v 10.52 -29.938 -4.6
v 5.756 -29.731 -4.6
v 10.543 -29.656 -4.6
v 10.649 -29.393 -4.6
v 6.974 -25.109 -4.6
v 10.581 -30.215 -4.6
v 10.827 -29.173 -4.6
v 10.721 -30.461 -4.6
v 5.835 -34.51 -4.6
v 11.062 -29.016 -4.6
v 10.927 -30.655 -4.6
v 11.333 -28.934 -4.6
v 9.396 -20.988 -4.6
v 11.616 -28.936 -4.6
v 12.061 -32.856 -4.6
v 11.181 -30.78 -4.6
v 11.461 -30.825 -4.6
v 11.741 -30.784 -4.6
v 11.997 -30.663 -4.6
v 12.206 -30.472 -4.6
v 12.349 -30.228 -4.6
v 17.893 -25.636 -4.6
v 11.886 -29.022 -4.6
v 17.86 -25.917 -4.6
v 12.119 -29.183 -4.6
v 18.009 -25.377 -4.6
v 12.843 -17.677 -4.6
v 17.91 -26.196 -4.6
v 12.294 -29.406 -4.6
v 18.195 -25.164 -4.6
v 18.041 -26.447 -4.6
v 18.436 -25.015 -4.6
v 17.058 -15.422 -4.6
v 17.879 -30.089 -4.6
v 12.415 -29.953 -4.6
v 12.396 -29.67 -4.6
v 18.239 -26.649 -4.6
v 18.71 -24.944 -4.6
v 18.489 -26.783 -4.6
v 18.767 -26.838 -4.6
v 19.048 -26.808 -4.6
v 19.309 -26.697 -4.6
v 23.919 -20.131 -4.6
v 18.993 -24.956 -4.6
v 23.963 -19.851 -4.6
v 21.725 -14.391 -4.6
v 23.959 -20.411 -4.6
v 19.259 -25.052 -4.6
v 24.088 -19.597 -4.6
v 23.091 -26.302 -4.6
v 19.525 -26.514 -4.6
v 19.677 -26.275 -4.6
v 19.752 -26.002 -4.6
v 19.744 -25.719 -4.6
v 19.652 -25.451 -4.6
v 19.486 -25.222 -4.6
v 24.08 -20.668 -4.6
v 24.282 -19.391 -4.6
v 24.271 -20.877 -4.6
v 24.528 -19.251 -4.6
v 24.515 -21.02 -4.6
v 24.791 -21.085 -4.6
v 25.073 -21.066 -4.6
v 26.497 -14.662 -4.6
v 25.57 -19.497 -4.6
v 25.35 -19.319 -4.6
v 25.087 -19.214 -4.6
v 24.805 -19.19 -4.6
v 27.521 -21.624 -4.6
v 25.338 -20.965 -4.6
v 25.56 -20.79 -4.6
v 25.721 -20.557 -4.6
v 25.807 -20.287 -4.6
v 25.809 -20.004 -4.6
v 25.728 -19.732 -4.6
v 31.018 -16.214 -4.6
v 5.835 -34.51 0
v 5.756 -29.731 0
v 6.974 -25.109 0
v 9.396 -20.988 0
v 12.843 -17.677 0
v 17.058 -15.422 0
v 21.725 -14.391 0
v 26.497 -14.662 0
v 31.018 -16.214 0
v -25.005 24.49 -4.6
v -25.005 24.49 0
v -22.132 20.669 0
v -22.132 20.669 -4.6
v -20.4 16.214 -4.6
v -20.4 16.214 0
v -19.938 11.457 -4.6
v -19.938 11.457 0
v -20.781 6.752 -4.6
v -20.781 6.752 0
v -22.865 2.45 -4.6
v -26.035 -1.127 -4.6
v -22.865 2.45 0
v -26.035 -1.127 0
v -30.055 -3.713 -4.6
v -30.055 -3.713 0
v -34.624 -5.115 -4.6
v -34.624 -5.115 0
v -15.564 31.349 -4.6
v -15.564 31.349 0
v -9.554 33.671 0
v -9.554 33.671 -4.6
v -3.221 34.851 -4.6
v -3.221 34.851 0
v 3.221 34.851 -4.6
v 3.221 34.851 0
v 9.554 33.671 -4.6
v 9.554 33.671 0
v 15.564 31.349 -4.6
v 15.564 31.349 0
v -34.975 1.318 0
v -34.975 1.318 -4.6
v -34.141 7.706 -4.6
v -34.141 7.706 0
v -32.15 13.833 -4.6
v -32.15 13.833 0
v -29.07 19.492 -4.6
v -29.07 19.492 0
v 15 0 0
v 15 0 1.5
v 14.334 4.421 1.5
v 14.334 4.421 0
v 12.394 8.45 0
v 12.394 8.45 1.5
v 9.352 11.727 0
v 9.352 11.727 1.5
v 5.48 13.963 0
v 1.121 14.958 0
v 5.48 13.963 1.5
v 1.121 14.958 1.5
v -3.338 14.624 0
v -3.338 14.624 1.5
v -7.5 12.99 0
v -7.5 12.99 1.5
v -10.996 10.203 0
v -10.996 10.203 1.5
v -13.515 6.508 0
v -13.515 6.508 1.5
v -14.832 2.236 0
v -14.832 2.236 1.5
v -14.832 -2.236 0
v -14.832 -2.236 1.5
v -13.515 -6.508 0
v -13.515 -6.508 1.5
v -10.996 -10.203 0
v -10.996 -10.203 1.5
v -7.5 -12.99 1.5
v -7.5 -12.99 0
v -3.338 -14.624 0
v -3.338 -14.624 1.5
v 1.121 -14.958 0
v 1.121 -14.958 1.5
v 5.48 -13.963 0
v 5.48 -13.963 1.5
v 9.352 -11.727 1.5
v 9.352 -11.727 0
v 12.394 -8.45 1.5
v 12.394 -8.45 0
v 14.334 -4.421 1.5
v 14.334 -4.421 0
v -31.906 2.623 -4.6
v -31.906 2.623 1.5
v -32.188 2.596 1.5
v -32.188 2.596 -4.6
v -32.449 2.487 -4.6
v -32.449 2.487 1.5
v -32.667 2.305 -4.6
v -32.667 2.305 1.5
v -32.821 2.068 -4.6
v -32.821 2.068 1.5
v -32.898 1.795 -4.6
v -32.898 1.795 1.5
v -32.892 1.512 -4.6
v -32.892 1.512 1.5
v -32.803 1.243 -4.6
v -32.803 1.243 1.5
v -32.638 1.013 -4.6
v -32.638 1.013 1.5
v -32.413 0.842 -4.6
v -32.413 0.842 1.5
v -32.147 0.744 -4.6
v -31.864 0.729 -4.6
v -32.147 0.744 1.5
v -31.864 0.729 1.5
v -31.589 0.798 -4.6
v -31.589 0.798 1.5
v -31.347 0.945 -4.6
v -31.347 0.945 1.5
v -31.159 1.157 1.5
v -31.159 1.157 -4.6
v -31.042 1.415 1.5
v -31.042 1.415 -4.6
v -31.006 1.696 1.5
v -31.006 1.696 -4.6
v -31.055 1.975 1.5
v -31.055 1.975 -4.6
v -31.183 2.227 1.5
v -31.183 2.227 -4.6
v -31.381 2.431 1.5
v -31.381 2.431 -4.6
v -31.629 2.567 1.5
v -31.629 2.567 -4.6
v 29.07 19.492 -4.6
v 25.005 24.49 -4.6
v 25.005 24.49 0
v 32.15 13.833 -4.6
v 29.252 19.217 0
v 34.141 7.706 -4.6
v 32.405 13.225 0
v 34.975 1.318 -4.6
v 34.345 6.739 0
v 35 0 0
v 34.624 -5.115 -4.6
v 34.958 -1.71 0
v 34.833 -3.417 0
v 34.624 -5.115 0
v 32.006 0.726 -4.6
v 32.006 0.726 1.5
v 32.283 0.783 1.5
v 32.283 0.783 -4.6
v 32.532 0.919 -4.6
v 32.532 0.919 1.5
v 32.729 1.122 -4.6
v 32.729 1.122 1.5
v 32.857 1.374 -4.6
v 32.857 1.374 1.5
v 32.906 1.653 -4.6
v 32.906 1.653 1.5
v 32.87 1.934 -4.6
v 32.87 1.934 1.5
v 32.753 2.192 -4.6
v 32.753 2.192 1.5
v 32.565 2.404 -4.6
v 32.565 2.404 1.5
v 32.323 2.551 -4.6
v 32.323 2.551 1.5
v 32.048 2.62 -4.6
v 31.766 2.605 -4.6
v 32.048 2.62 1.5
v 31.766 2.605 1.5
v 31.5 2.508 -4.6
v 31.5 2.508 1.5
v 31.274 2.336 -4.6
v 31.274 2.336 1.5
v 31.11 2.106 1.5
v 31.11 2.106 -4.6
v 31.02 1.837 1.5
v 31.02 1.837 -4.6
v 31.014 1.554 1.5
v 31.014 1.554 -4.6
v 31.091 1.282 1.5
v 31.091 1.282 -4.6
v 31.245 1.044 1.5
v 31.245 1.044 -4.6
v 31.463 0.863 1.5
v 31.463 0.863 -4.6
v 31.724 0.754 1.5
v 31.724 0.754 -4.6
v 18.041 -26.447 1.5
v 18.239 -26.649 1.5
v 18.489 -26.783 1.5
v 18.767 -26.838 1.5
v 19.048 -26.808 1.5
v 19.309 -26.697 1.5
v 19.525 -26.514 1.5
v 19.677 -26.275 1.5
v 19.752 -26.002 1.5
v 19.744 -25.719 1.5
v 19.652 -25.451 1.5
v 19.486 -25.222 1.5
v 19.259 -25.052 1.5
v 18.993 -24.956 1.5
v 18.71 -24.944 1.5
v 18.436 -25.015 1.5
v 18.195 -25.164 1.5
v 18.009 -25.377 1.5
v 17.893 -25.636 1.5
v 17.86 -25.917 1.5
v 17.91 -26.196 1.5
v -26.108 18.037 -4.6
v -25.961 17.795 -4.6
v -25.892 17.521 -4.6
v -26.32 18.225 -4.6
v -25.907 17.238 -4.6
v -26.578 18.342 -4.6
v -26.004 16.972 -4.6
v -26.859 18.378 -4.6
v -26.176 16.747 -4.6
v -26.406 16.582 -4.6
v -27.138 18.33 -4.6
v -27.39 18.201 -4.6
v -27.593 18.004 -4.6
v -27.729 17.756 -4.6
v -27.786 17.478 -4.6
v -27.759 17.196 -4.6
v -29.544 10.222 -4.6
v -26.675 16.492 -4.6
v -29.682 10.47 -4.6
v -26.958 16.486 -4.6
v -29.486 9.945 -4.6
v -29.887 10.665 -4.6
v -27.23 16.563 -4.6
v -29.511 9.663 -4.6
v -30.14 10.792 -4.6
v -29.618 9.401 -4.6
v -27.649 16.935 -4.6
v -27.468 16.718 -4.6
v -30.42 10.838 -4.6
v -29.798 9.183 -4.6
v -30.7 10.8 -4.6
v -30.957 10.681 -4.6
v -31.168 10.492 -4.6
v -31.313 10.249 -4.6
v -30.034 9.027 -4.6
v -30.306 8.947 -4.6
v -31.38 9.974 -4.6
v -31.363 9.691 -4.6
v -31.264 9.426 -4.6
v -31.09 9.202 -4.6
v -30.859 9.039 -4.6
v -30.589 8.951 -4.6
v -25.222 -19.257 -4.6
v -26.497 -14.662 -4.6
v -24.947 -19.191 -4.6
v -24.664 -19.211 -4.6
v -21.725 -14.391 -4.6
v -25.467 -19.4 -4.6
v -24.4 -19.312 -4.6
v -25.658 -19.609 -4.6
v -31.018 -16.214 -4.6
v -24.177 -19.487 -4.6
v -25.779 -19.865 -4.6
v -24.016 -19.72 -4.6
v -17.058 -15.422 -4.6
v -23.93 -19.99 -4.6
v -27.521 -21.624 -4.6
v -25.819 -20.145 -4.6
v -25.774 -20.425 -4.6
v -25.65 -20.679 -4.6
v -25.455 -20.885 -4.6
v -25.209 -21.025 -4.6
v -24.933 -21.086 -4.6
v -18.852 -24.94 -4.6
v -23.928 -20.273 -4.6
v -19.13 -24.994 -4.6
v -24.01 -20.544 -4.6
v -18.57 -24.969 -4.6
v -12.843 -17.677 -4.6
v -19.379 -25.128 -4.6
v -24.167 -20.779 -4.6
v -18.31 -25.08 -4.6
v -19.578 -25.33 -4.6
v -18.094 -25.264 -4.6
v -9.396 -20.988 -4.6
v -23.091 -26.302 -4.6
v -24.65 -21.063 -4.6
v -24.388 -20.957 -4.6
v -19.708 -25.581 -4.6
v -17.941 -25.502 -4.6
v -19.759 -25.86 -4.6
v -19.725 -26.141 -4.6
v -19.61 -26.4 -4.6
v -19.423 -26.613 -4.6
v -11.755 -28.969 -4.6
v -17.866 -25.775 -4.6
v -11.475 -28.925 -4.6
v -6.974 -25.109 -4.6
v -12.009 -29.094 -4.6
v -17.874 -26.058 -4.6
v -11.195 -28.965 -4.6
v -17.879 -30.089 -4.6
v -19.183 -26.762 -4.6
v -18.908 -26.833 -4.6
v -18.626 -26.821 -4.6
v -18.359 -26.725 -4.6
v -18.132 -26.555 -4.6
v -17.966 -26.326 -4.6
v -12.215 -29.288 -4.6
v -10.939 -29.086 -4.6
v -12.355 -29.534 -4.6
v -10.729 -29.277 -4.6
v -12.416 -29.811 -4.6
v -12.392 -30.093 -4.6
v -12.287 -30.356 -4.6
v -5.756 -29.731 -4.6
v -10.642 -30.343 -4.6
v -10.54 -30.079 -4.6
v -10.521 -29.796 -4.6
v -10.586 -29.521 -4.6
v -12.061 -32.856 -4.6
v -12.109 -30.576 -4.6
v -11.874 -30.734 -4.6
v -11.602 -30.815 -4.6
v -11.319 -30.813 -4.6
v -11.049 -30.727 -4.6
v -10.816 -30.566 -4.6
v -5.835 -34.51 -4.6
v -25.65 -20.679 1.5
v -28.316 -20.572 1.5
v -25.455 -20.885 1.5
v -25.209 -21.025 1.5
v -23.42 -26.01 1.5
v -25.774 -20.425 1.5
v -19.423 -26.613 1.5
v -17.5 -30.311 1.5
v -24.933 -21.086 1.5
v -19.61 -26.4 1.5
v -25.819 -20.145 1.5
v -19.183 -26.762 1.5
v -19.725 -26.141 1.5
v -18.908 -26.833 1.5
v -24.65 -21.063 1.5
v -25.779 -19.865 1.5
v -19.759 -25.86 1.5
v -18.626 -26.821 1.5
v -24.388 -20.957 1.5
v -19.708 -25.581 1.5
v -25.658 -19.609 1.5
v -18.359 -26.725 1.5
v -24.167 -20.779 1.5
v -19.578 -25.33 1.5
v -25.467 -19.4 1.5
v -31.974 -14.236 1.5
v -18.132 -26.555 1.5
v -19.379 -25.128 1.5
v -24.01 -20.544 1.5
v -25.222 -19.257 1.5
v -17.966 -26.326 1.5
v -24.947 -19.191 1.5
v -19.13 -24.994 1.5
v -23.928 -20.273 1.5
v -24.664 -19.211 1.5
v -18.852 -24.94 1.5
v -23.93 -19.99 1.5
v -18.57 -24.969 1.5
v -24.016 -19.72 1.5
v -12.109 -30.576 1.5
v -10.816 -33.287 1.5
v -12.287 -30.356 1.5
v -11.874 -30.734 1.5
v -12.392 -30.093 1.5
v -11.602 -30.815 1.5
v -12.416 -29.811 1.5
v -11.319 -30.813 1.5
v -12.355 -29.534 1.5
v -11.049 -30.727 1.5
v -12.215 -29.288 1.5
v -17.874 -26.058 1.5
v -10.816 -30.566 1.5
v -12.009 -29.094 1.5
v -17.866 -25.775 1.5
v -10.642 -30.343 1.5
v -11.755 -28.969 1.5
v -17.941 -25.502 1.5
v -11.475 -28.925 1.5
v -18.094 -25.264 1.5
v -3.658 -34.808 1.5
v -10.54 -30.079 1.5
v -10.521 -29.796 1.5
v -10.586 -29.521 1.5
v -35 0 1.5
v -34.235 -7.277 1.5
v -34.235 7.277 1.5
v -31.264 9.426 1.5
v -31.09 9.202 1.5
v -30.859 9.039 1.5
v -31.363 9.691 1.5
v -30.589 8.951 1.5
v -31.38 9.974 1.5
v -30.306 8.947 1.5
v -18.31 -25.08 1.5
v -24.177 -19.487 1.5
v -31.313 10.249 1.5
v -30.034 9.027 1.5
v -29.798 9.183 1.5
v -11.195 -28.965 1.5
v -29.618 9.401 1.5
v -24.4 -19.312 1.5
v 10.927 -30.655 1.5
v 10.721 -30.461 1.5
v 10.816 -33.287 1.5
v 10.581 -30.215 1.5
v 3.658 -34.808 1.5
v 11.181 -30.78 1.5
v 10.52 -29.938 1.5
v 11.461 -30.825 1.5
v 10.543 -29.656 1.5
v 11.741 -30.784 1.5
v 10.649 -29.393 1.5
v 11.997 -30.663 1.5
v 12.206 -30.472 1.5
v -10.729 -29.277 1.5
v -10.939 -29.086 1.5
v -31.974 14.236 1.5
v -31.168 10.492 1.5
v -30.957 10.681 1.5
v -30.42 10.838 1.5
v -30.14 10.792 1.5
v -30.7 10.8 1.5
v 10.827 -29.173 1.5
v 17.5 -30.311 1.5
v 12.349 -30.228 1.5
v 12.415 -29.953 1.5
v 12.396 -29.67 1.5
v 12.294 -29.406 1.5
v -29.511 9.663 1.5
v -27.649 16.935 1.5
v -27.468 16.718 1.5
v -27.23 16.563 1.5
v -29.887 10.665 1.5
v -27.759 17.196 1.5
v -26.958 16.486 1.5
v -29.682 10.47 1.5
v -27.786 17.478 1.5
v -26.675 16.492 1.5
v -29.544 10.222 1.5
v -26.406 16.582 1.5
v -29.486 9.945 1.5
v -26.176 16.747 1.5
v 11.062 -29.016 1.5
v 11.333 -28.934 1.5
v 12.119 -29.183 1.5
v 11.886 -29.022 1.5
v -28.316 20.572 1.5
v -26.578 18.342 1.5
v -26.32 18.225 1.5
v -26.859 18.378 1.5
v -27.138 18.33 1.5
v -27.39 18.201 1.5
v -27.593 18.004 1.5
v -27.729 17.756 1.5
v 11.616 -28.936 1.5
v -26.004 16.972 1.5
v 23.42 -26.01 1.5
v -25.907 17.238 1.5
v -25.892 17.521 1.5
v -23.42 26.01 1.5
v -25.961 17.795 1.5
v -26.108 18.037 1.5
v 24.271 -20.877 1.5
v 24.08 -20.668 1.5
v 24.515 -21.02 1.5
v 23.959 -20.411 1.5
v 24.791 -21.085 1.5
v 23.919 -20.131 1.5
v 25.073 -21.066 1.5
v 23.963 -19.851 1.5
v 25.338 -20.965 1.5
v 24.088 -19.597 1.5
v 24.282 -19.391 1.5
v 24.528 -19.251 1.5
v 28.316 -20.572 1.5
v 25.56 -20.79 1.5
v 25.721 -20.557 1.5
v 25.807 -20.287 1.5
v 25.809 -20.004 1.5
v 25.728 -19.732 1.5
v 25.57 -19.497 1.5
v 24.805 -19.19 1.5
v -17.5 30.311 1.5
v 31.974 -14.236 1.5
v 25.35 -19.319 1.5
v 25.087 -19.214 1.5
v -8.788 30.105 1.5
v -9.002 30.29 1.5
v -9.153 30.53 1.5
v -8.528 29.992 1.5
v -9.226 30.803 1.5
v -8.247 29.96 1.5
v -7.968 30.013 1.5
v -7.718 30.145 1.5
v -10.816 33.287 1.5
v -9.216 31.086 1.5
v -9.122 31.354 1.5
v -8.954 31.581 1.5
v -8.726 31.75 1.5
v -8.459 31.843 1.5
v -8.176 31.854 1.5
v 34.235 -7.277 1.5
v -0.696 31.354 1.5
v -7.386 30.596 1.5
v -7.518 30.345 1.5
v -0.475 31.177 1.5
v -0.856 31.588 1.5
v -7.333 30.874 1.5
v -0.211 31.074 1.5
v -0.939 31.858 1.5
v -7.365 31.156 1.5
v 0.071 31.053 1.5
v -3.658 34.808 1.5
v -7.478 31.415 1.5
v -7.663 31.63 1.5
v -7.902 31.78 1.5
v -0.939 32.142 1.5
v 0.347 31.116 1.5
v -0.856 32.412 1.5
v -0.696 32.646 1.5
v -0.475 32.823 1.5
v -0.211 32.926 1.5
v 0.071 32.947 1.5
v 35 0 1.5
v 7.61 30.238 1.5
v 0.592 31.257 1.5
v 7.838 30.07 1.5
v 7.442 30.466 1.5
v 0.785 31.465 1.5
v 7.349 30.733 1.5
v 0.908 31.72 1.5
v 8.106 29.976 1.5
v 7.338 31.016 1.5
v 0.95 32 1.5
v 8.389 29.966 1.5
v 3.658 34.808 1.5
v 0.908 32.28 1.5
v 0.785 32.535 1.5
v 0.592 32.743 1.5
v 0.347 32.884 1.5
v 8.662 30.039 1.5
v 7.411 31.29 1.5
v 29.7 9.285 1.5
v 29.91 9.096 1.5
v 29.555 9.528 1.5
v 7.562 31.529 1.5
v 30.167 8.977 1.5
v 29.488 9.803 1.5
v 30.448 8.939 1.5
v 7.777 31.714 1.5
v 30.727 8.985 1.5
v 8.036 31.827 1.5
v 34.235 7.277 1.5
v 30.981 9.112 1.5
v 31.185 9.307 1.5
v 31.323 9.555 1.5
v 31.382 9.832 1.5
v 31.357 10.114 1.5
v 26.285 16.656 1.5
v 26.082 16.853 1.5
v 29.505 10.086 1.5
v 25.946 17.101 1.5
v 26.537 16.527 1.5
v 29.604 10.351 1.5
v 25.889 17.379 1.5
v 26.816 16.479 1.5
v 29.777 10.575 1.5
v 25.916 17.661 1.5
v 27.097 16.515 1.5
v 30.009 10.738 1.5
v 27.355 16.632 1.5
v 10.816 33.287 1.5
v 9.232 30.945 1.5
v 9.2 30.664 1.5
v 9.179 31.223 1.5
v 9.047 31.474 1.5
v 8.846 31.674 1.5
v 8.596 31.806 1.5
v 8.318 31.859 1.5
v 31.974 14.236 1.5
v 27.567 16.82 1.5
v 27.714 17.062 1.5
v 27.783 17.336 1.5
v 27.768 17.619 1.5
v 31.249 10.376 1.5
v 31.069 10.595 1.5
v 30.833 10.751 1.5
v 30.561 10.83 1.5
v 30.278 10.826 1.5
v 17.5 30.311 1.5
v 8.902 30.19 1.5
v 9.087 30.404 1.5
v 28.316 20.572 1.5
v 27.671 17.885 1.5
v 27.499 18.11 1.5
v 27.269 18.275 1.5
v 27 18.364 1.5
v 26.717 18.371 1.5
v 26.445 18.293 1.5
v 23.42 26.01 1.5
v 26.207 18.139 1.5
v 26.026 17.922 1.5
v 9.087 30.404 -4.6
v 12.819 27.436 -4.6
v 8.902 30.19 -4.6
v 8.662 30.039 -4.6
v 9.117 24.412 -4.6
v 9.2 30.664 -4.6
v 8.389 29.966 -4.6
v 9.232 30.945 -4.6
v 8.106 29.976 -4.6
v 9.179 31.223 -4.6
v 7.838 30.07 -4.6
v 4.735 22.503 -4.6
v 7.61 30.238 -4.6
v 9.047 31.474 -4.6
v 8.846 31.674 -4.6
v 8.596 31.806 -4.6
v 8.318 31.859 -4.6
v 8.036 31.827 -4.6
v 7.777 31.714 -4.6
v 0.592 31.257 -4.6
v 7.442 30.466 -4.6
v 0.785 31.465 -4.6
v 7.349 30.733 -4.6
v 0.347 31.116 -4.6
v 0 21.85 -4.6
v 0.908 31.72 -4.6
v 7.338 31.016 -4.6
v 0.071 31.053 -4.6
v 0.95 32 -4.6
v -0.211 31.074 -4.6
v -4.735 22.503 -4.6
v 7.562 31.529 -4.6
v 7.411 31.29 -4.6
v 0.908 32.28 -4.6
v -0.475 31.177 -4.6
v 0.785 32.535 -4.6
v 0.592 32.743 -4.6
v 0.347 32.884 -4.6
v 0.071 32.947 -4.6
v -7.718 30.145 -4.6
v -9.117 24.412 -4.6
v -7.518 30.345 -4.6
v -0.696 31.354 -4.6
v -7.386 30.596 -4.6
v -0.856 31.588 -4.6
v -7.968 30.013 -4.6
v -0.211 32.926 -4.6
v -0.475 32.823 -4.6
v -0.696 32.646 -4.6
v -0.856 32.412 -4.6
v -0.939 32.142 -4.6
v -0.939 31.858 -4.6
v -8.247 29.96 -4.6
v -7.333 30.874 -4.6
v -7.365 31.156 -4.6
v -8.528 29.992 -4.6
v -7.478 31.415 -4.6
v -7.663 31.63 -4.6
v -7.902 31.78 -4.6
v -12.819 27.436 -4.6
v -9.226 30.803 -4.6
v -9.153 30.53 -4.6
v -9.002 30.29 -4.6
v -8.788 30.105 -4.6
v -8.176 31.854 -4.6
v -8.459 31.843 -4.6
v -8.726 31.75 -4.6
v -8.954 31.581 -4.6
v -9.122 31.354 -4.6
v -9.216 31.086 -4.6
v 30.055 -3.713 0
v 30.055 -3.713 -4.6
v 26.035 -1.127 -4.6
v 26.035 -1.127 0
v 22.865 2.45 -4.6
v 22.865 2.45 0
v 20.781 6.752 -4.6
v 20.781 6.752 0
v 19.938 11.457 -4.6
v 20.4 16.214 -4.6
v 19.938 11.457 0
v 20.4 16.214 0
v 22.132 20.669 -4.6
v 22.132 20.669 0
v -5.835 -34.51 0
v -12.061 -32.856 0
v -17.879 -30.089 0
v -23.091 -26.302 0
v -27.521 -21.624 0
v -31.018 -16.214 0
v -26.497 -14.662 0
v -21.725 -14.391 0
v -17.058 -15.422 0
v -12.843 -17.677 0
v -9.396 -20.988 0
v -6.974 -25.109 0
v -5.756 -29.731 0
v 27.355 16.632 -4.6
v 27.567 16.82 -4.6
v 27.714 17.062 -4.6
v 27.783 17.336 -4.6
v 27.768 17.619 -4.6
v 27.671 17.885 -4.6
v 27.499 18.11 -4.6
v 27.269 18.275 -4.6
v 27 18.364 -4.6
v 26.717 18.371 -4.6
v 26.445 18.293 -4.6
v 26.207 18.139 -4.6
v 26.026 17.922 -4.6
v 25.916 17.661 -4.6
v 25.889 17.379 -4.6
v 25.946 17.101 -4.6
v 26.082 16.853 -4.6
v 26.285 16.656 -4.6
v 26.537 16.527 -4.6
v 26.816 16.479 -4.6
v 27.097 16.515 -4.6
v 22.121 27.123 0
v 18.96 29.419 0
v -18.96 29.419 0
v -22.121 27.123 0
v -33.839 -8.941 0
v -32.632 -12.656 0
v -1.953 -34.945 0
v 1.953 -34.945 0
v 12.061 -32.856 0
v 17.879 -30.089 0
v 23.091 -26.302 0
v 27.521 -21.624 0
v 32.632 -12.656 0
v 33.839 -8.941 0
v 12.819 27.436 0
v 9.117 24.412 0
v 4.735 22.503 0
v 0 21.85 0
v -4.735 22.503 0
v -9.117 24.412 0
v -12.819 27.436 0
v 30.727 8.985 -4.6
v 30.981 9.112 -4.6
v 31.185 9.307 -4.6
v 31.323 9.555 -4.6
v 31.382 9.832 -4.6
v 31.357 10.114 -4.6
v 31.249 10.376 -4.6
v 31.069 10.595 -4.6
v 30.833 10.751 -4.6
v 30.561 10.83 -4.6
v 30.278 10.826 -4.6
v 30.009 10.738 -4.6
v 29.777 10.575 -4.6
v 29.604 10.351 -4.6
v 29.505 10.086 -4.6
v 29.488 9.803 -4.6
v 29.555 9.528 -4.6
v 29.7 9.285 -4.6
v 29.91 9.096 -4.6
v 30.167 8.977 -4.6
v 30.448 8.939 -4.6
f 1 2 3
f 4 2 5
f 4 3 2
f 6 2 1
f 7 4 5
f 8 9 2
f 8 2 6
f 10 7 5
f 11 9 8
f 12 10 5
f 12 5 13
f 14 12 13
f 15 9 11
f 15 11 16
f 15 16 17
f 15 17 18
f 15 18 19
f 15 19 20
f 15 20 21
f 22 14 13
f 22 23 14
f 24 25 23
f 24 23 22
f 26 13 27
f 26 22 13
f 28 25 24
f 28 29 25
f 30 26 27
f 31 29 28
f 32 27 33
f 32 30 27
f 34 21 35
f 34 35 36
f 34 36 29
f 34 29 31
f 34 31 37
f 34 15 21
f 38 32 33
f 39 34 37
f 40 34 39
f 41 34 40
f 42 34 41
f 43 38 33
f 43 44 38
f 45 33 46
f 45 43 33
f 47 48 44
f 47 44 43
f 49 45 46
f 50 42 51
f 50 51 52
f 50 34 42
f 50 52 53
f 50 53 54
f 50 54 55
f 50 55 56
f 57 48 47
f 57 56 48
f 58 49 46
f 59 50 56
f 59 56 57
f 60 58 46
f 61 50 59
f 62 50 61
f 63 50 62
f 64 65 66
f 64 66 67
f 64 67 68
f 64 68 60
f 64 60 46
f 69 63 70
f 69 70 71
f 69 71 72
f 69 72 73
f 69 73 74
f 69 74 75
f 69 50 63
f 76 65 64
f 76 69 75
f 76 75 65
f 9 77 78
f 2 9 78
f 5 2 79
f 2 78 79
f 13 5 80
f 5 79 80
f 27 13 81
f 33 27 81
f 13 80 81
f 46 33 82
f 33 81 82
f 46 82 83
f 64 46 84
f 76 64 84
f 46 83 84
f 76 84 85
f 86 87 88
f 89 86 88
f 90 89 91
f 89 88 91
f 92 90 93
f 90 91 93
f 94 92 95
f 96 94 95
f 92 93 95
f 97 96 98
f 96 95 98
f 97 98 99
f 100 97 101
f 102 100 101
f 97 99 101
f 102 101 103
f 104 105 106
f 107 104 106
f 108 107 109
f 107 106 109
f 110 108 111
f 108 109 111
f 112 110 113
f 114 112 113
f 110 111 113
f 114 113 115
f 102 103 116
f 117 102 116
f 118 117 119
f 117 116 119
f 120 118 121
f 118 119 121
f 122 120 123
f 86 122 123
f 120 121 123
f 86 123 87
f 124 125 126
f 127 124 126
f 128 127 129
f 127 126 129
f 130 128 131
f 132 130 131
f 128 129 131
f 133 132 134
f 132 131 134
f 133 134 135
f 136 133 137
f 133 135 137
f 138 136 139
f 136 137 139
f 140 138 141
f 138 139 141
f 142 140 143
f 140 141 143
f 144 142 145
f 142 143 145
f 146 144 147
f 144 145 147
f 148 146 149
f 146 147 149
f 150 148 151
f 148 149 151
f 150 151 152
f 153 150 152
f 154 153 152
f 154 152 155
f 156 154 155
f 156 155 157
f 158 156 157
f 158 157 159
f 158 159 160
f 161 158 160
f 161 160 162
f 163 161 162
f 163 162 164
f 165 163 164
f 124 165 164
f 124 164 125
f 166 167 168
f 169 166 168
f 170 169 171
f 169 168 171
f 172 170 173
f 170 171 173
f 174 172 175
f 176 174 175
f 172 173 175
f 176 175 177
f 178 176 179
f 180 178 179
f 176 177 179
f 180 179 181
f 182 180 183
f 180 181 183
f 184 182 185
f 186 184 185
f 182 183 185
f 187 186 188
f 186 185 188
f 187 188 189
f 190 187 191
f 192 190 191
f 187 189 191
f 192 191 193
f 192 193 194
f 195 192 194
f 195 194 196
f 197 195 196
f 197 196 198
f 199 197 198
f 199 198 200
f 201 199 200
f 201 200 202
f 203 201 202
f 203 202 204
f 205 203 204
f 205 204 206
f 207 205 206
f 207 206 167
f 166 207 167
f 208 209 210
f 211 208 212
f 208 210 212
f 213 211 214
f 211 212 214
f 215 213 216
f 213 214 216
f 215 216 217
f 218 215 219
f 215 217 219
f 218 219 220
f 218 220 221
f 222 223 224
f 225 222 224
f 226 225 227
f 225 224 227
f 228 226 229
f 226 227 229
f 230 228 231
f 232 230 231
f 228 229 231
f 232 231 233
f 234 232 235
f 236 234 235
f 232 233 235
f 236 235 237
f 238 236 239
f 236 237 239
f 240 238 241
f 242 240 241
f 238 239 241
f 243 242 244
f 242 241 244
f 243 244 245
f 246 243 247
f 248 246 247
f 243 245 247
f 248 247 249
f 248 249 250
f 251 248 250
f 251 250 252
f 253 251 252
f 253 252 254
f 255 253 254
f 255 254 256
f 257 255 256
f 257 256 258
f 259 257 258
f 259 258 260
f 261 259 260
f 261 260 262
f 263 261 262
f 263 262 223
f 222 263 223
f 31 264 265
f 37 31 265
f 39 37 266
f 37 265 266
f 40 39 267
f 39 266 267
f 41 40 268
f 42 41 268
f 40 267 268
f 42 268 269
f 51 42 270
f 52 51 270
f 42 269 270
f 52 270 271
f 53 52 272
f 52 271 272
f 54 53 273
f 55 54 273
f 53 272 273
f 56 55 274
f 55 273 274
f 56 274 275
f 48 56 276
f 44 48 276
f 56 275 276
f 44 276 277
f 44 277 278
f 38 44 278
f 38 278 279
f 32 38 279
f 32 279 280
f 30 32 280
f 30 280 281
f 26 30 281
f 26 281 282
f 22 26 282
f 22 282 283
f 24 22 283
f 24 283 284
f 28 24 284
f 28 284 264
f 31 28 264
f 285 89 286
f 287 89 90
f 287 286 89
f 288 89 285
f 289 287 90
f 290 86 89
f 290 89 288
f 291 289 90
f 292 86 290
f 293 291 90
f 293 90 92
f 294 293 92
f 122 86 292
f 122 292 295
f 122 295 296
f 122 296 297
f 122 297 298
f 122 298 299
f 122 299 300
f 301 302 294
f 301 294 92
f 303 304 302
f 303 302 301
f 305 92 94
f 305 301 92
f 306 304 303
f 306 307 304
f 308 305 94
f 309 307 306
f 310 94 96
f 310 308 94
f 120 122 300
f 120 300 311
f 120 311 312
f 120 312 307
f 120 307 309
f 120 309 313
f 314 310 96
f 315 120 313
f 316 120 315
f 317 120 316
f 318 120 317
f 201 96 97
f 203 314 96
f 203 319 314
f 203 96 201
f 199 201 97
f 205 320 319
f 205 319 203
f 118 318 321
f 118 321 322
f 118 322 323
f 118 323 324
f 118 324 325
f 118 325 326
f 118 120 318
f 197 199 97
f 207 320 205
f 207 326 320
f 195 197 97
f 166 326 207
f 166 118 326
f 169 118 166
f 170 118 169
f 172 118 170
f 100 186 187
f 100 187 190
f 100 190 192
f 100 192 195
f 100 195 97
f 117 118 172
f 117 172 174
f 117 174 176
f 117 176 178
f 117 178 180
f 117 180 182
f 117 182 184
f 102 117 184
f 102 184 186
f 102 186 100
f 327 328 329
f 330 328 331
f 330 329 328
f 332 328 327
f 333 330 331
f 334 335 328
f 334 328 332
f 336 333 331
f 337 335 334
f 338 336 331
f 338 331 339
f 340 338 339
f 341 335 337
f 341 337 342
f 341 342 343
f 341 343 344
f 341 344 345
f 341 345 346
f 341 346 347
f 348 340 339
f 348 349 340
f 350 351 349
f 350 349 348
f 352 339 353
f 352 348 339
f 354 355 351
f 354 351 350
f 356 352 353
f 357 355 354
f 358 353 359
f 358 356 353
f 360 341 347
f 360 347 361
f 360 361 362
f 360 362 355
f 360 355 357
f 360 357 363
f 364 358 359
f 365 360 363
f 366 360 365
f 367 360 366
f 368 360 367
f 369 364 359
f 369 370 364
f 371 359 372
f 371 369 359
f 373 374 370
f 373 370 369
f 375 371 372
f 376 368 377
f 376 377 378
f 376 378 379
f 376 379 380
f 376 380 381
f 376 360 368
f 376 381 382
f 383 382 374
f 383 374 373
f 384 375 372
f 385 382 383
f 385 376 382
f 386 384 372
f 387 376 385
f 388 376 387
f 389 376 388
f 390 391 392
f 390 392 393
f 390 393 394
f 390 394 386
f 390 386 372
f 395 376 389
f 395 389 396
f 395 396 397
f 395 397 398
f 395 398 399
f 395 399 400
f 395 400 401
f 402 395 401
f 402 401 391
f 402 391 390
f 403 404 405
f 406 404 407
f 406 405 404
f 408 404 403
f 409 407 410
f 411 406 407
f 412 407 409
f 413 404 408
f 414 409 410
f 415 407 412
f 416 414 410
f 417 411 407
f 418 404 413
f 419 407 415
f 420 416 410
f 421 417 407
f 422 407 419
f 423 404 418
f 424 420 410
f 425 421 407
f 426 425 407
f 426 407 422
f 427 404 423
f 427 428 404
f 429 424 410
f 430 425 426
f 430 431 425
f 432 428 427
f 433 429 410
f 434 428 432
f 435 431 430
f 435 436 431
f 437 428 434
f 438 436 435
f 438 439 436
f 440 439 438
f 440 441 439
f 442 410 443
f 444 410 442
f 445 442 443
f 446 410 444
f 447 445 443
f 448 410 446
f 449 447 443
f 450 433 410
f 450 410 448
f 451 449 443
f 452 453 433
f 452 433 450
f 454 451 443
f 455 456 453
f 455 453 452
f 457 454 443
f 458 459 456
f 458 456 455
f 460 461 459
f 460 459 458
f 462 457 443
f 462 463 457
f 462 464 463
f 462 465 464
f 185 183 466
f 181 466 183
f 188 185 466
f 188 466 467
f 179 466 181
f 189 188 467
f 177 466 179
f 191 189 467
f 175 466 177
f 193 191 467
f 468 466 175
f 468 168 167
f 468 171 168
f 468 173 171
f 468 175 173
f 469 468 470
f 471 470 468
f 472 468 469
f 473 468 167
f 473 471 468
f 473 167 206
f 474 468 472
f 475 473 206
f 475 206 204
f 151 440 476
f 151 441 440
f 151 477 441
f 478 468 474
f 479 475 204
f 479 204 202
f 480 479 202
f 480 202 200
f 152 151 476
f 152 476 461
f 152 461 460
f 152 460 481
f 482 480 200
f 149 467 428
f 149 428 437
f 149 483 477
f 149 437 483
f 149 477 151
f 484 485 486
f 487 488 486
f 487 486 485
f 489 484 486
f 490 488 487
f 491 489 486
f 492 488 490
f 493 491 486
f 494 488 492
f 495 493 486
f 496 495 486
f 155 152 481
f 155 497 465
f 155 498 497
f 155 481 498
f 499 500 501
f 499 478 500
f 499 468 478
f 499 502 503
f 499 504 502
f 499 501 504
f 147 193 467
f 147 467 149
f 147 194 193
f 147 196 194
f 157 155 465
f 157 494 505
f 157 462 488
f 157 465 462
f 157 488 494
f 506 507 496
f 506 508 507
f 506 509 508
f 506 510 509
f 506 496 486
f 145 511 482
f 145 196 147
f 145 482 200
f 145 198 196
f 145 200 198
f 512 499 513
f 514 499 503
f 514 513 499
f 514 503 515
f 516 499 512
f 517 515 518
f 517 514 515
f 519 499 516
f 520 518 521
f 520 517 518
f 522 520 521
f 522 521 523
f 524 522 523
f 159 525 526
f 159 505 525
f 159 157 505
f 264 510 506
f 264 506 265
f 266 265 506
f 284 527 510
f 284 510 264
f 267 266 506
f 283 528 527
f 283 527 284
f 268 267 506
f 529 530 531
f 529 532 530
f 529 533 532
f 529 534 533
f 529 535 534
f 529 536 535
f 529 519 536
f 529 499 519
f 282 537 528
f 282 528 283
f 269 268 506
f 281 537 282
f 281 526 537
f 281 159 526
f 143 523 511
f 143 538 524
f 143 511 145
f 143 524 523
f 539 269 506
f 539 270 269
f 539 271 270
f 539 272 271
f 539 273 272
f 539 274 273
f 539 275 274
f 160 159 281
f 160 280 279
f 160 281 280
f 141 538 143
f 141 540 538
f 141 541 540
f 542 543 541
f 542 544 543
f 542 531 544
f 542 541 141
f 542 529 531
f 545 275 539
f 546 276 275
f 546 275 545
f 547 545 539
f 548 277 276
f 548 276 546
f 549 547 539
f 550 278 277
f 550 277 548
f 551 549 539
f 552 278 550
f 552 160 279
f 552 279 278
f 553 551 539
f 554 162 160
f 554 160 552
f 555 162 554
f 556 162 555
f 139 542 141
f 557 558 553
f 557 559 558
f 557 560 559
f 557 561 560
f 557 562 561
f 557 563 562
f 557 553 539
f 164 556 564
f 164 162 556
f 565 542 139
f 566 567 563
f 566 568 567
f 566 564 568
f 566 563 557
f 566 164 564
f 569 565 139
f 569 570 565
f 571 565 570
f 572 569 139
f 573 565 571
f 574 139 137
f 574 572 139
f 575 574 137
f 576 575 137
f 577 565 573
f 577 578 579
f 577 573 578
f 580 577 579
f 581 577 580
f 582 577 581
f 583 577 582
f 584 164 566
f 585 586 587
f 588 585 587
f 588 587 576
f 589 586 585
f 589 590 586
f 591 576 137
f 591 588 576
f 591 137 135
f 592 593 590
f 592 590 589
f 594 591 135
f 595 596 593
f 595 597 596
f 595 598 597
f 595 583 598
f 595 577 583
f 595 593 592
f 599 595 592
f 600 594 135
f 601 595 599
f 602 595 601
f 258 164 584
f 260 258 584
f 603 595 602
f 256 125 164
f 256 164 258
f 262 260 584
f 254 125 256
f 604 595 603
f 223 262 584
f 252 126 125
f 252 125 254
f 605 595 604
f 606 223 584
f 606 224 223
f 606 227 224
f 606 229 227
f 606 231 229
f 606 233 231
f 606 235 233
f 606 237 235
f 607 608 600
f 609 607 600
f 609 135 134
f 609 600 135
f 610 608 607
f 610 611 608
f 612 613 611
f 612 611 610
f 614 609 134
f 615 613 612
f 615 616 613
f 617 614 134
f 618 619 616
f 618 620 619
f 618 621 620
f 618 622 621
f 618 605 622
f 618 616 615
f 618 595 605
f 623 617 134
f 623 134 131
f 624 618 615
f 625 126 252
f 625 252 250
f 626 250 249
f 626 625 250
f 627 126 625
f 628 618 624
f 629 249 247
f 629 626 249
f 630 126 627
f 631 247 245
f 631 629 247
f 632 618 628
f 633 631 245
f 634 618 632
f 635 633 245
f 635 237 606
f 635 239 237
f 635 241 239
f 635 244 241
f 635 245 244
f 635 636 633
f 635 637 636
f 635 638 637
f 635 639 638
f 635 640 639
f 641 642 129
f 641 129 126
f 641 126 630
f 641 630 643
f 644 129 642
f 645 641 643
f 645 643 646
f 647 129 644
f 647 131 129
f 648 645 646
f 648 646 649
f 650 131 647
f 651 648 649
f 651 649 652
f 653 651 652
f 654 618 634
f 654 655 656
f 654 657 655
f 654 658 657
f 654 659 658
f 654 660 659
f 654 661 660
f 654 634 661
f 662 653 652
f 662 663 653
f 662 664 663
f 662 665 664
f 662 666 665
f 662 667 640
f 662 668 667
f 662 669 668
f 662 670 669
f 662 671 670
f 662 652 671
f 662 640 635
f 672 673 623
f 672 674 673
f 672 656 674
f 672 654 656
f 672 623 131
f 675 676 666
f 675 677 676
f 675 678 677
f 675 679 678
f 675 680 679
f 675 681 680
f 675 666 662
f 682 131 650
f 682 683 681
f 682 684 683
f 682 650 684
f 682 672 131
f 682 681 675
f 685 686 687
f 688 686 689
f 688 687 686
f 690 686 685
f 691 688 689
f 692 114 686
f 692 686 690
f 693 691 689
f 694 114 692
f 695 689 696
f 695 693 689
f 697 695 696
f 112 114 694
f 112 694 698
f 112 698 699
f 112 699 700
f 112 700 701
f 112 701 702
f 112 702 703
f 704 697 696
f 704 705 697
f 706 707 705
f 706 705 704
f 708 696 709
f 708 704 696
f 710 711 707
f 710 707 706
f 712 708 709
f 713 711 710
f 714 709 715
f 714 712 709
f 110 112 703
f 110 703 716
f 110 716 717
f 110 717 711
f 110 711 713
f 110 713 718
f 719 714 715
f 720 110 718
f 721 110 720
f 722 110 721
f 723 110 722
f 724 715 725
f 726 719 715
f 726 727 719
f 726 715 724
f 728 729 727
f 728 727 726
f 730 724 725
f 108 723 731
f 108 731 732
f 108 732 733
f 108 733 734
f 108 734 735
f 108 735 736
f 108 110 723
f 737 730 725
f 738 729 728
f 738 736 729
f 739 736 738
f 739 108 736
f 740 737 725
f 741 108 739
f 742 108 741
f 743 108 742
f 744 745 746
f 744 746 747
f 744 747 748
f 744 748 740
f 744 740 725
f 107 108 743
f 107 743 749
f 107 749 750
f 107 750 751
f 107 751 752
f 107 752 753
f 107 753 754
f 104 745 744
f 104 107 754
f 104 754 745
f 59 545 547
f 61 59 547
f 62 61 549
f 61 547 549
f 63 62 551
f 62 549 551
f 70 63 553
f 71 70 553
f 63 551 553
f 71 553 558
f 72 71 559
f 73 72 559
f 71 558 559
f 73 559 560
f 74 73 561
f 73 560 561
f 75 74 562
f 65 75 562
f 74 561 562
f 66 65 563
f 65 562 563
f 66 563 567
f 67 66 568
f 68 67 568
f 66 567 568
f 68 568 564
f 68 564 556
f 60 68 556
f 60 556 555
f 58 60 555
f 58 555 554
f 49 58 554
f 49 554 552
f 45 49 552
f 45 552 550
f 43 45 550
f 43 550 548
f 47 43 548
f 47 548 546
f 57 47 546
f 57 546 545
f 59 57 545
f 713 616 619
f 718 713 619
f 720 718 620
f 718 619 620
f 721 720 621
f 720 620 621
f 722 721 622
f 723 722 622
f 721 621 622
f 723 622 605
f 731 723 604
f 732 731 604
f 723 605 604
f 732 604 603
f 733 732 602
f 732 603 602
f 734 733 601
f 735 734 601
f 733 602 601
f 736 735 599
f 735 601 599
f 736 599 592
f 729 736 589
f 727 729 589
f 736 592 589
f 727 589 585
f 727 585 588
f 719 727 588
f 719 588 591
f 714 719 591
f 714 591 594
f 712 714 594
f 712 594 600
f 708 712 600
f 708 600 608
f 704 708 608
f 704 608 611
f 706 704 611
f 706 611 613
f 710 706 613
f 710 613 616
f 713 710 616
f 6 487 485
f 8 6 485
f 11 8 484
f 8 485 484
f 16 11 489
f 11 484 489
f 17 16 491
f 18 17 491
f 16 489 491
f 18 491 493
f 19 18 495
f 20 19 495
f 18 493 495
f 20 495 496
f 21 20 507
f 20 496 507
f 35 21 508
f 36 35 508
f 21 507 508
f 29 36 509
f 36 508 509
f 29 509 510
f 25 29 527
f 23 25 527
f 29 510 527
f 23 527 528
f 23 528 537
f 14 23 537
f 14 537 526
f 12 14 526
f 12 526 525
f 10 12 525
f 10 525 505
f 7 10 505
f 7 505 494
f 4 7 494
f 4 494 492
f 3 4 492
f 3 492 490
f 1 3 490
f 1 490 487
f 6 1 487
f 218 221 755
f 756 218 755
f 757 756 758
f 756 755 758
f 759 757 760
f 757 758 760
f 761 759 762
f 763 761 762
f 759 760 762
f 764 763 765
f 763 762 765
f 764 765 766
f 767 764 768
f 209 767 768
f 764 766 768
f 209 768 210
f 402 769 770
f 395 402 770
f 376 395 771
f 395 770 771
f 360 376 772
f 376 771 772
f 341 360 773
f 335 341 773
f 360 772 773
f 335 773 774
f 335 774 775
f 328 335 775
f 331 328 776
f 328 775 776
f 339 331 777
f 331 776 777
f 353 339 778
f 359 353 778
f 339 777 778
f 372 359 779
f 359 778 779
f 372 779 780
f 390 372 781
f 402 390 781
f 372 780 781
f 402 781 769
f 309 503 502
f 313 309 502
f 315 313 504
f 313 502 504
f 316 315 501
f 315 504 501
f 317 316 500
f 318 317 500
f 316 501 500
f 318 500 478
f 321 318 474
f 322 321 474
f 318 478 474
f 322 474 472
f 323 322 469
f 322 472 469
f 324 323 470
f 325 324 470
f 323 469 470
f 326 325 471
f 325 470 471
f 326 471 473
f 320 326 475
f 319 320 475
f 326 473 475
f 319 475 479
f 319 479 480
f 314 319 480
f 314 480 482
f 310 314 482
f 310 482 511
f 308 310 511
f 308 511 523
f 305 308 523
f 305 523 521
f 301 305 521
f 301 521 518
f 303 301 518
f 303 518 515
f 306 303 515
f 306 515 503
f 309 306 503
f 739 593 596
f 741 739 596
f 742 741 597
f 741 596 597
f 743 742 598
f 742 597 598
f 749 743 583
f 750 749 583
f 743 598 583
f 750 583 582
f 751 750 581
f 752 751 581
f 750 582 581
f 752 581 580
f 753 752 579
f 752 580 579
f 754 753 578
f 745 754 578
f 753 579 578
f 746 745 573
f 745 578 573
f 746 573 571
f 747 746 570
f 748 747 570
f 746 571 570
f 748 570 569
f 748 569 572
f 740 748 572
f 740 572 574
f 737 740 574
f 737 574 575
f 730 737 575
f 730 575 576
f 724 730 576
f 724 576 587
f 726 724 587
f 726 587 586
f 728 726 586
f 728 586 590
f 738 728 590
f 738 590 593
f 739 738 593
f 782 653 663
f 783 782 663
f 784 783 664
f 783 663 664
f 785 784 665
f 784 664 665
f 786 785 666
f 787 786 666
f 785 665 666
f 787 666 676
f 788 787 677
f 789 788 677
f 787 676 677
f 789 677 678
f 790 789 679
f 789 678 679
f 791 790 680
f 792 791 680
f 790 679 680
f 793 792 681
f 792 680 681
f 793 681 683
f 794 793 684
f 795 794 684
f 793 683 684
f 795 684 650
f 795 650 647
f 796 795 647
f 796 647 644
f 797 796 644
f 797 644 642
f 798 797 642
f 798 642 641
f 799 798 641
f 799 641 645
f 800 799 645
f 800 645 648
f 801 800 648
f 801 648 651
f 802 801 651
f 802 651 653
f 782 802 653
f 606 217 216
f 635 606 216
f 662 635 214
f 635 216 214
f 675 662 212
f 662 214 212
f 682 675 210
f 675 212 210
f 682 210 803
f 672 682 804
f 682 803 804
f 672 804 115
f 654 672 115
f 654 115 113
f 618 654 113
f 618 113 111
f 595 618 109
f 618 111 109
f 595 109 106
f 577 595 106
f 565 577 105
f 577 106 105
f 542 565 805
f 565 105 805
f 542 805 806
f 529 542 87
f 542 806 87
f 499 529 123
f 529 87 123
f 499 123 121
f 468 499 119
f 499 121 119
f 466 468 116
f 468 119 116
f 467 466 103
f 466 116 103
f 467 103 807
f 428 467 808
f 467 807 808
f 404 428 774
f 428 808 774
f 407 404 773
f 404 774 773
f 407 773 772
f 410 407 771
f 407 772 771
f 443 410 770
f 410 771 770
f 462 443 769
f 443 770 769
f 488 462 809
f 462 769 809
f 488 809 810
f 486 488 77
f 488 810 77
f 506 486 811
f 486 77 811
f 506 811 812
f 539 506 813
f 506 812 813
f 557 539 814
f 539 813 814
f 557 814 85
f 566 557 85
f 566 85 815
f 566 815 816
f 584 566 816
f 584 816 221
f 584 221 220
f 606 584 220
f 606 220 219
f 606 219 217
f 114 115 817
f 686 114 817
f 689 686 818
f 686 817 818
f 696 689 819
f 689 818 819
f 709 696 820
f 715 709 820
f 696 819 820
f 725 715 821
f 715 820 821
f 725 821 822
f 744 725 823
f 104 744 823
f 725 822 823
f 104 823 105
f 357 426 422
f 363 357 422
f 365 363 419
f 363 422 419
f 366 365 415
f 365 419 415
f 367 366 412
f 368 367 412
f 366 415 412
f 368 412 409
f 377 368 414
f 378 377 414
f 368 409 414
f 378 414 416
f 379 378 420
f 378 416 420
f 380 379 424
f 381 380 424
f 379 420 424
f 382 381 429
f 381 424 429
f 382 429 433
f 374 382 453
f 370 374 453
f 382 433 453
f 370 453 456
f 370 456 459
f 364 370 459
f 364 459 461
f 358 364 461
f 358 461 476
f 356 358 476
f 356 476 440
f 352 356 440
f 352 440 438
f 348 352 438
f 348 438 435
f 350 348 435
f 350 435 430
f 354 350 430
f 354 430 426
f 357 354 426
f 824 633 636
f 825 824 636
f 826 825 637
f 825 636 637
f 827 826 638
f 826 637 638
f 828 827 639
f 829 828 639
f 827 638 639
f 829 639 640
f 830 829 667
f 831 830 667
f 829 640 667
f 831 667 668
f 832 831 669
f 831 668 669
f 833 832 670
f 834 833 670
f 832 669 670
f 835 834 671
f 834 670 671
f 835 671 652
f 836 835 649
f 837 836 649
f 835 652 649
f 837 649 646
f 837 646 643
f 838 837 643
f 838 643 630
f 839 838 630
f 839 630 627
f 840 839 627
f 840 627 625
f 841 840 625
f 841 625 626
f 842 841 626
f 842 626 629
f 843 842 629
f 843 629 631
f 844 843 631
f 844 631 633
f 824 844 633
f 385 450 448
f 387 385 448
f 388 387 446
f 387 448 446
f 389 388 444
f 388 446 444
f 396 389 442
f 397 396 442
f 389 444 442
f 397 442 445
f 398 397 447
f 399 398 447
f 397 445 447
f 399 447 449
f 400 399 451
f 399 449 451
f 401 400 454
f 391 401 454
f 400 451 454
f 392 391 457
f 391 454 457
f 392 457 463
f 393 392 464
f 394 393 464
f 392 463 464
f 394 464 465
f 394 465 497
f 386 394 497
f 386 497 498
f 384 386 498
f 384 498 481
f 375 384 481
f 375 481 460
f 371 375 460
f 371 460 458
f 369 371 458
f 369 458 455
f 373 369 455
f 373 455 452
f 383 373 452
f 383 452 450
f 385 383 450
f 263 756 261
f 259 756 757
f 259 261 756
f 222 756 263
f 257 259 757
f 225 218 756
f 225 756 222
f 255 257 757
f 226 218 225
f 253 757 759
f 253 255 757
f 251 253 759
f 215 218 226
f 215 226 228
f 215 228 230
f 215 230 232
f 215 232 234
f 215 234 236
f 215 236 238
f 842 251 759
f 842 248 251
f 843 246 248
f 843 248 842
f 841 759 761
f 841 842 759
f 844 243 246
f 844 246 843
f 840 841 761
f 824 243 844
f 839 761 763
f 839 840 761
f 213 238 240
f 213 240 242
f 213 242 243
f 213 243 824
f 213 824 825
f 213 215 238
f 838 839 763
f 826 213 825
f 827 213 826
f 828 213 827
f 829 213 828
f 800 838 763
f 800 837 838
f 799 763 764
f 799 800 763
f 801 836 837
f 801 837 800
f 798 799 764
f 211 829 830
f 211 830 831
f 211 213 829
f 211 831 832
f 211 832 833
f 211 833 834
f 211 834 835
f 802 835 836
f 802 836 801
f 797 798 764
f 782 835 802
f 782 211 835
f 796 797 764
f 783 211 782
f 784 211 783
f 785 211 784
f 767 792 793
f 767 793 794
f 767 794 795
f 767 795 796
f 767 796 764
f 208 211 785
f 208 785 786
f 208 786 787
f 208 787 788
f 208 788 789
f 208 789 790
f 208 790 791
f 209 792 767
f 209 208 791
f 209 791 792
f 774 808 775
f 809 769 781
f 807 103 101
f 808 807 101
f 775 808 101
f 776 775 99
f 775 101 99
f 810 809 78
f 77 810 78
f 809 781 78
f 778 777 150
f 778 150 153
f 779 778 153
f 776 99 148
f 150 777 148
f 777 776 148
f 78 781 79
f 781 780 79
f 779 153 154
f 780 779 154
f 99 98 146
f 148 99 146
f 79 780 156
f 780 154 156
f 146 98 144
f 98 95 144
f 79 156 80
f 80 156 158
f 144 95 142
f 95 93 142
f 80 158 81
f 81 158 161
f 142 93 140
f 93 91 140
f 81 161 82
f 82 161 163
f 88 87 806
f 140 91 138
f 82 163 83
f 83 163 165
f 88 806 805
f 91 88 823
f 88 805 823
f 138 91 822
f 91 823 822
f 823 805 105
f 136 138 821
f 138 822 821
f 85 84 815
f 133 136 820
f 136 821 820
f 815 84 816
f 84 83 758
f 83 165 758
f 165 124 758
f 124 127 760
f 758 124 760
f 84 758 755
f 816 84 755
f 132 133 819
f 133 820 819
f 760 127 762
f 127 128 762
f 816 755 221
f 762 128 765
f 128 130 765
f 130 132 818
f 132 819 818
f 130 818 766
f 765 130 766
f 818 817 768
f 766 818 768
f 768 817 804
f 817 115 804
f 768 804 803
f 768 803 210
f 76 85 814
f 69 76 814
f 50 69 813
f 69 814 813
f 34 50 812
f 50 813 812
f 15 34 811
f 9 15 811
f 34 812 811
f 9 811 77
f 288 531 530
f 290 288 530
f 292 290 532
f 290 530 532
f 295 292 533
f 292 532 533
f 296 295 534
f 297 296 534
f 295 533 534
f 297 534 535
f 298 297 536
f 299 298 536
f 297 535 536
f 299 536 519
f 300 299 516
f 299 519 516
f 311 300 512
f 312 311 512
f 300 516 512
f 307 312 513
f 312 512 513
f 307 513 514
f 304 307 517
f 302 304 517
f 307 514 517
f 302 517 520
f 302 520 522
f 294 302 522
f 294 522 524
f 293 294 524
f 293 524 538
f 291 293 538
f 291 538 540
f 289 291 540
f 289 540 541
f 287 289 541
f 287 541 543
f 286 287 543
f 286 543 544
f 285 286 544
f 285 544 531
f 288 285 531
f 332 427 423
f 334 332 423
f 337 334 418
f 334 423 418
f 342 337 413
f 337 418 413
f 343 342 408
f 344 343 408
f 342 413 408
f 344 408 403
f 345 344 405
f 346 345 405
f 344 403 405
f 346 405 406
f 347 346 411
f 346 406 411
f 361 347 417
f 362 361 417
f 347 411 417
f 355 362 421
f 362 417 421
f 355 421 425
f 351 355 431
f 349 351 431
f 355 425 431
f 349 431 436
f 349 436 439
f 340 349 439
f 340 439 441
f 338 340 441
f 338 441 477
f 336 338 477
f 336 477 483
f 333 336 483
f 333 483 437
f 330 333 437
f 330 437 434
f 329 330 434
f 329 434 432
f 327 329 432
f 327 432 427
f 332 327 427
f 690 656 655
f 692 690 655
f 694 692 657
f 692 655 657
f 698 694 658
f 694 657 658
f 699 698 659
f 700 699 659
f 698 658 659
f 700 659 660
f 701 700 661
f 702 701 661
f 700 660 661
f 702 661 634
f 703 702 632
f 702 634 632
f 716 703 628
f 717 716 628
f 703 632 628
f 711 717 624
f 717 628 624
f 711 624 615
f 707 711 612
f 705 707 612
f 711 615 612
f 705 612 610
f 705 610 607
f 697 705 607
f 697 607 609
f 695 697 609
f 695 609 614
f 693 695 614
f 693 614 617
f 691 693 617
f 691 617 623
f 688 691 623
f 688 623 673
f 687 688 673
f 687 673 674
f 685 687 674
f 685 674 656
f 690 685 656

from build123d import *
from build123d.topology import SkipClean

# Parameters (mm, degrees)
SKETCH1_R                   = 35
BOSS_EXTRUDE1_DEPTH         = 1.5
BOSS_EXTRUDE2_START         = 4.6
BOSS_EXTRUDE2_DEPTH         = 4.6
SKETCH4_R                   = 0.95
CUT_EXTRUDE2_DEPTH          = 50.871935996
CIRPATTERN5_COUNT           = 2
CIRPATTERN5_ANGLE           = 15
CIRPATTERN6_COUNT           = 2
CIRPATTERN6_ANGLE           = 15
CIRPATTERN1_COUNT           = 5
CIRPATTERN1_COPY_1_SKETCH_R = 0.95
CIRPATTERN1_COPY_1_DEPTH    = 50.871935996
CIRPATTERN1_COPY_2_SKETCH_R = 0.95
CIRPATTERN1_COPY_2_DEPTH    = 50.871935996
CIRPATTERN1_COPY_3_SKETCH_R = 0.95
CIRPATTERN1_COPY_3_DEPTH    = 50.871935996
CIRPATTERN1_COPY_4_SKETCH_R = 0.95
CIRPATTERN1_COPY_4_DEPTH    = 50.871935996
CIRPATTERN1_COPY_5_SKETCH_R = 0.95
CIRPATTERN1_COPY_5_DEPTH    = 50.871935996
CIRPATTERN1_COPY_6_SKETCH_R = 0.95
CIRPATTERN1_COPY_6_DEPTH    = 50.871935996
CIRPATTERN1_COPY_7_SKETCH_R = 0.95
CIRPATTERN1_COPY_7_DEPTH    = 50.871935996
CIRPATTERN1_COPY_8_SKETCH_R = 0.95
CIRPATTERN1_COPY_8_DEPTH    = 50.871935996
SKETCH3_R                   = 15
CUT_EXTRUDE1_DEPTH          = 50.871935996


with BuildPart() as part:
    # Sketch1 → Boss-Extrude1 (new body)
    with BuildSketch(Plane.XY):
        Circle(SKETCH1_R)
    extrude(amount=BOSS_EXTRUDE1_DEPTH)

    # Sketch2 → Boss-Extrude2 (add)
    with SkipClean():  # the faces are left unmerged after this step: merging them gives an invalid solid
        with BuildSketch(Plane(origin=(0, 0, 0), x_dir=(-1, 0, 0), z_dir=(0, 0, -1)).offset(BOSS_EXTRUDE2_START)):
            with BuildLine():
                ThreePointArc((-15.56390888, 31.34907878), (0, 21.85), (15.56390888, 31.34907878))
                ThreePointArc((15.56390888, 31.34907878), (0, 35), (-15.56390888, 31.34907878))
            make_face()
        boss_extrude2 = extrude(amount=-BOSS_EXTRUDE2_DEPTH)

    # Sketch4 → Cut-Extrude2 (cut, through all)
    with SkipClean():  # the faces are left unmerged after this step: merging them gives an invalid solid
        with BuildSketch(Plane.XY.offset(1.5)):
            with Locations((0, 32)):
                Circle(SKETCH4_R)
        cut_extrude2 = extrude(amount=-CUT_EXTRUDE2_DEPTH, mode=Mode.SUBTRACT)

    # CirPattern5: Cut-Extrude2 ×2 about axis
    with SkipClean():  # the faces are left unmerged after this step: merging them gives an invalid solid
        cirpattern5_axis = Axis((0, 0, -88.99), (0, 0, 1))
        for i in range(1, CIRPATTERN5_COUNT):
            add(cut_extrude2.rotate(cirpattern5_axis, i * CIRPATTERN5_ANGLE / (CIRPATTERN5_COUNT - 1)), mode=Mode.SUBTRACT)

    # CirPattern6: Cut-Extrude2 ×2 about axis
    with SkipClean():  # the faces are left unmerged after this step: merging them gives an invalid solid
        cirpattern6_axis = Axis((0, 0, -88.99), (0, 0, -1))
        for i in range(1, CIRPATTERN6_COUNT):
            add(cut_extrude2.rotate(cirpattern6_axis, i * CIRPATTERN6_ANGLE / (CIRPATTERN6_COUNT - 1)), mode=Mode.SUBTRACT)

    # CirPattern1: Boss-Extrude2, Cut-Extrude2 ×5 about axis
    with SkipClean():  # the faces are left unmerged after this step: merging them gives an invalid solid
        cirpattern1_axis = Axis((0, 0, -88.99), (0, 0, 1))
        add([boss_extrude2.rotate(cirpattern1_axis, i * 360 / CIRPATTERN1_COUNT) for i in range(1, CIRPATTERN1_COUNT)])
        add([cut_extrude2.rotate(cirpattern1_axis, i * 360 / CIRPATTERN1_COUNT) for i in range(1, CIRPATTERN1_COUNT)], mode=Mode.SUBTRACT)

    # CirPattern1 copy 1 sketch → CirPattern1 copy 1 (cut, through all)
    with SkipClean():  # the faces are left unmerged after this step: merging them gives an invalid solid
        with BuildSketch(Plane(origin=(0, 0, 1.5), x_dir=(0.05233595624294324, 0.9986295347545739, 0), z_dir=(0, 0, 1))):
            with Locations((0, 32)):
                Circle(CIRPATTERN1_COPY_1_SKETCH_R)
        extrude(amount=-CIRPATTERN1_COPY_1_DEPTH, mode=Mode.SUBTRACT)

    # CirPattern1 copy 2 sketch → CirPattern1 copy 2 (cut, through all)
    with SkipClean():  # the faces are left unmerged after this step: merging them gives an invalid solid
        with BuildSketch(Plane(origin=(0, 0, 1.5), x_dir=(-0.9335804264972019, 0.3583679495452998, 0), z_dir=(0, 0, 1))):
            with Locations((0, 32)):
                Circle(CIRPATTERN1_COPY_2_SKETCH_R)
        extrude(amount=-CIRPATTERN1_COPY_2_DEPTH, mode=Mode.SUBTRACT)

    # CirPattern1 copy 3 sketch → CirPattern1 copy 3 (cut, through all)
    with SkipClean():  # the faces are left unmerged after this step: merging them gives an invalid solid
        with BuildSketch(Plane(origin=(0, 0, 1.5), x_dir=(-0.6293203910498371, -0.7771459614569711, 0), z_dir=(0, 0, 1))):
            with Locations((0, 32)):
                Circle(CIRPATTERN1_COPY_3_SKETCH_R)
        extrude(amount=-CIRPATTERN1_COPY_3_DEPTH, mode=Mode.SUBTRACT)

    # CirPattern1 copy 4 sketch → CirPattern1 copy 4 (cut, through all)
    with SkipClean():  # the faces are left unmerged after this step: merging them gives an invalid solid
        with BuildSketch(Plane(origin=(0, 0, 1.5), x_dir=(0.5446390350150274, -0.8386705679454238, 0), z_dir=(0, 0, 1))):
            with Locations((0, 32)):
                Circle(CIRPATTERN1_COPY_4_SKETCH_R)
        extrude(amount=-CIRPATTERN1_COPY_4_DEPTH, mode=Mode.SUBTRACT)

    # CirPattern1 copy 5 sketch → CirPattern1 copy 5 (cut, through all)
    with SkipClean():  # the faces are left unmerged after this step: merging them gives an invalid solid
        with BuildSketch(Plane(origin=(0, 0, 1.5), x_dir=(0.5446390350150276, 0.8386705679454236, 0), z_dir=(0, 0, 1))):
            with Locations((0, 32)):
                Circle(CIRPATTERN1_COPY_5_SKETCH_R)
        extrude(amount=-CIRPATTERN1_COPY_5_DEPTH, mode=Mode.SUBTRACT)

    # CirPattern1 copy 6 sketch → CirPattern1 copy 6 (cut, through all)
    with SkipClean():  # the faces are left unmerged after this step: merging them gives an invalid solid
        with BuildSketch(Plane(origin=(0, 0, 1.5), x_dir=(-0.6293203910498368, 0.7771459614569713, 0), z_dir=(0, 0, 1))):
            with Locations((0, 32)):
                Circle(CIRPATTERN1_COPY_6_SKETCH_R)
        extrude(amount=-CIRPATTERN1_COPY_6_DEPTH, mode=Mode.SUBTRACT)

    # CirPattern1 copy 7 sketch → CirPattern1 copy 7 (cut, through all)
    with SkipClean():  # the faces are left unmerged after this step: merging them gives an invalid solid
        with BuildSketch(Plane(origin=(0, 0, 1.5), x_dir=(-0.9335804264972021, -0.3583679495452995, 0), z_dir=(0, 0, 1))):
            with Locations((0, 32)):
                Circle(CIRPATTERN1_COPY_7_SKETCH_R)
        extrude(amount=-CIRPATTERN1_COPY_7_DEPTH, mode=Mode.SUBTRACT)

    # CirPattern1 copy 8 sketch → CirPattern1 copy 8 (cut, through all)
    with SkipClean():  # the faces are left unmerged after this step: merging them gives an invalid solid
        with BuildSketch(Plane(origin=(0, 0, 1.5), x_dir=(0.05233595624294293, -0.9986295347545739, 0), z_dir=(0, 0, 1))):
            with Locations((0, 32)):
                Circle(CIRPATTERN1_COPY_8_SKETCH_R)
        extrude(amount=-CIRPATTERN1_COPY_8_DEPTH, mode=Mode.SUBTRACT)

    # Sketch3 → Cut-Extrude1 (cut, through all)
    with SkipClean():  # the faces are left unmerged after this step: merging them gives an invalid solid
        with BuildSketch(Plane.XY.offset(1.5)):
            Circle(SKETCH3_R)
        extrude(amount=-CUT_EXTRUDE1_DEPTH, mode=Mode.SUBTRACT)


solid = part.part
